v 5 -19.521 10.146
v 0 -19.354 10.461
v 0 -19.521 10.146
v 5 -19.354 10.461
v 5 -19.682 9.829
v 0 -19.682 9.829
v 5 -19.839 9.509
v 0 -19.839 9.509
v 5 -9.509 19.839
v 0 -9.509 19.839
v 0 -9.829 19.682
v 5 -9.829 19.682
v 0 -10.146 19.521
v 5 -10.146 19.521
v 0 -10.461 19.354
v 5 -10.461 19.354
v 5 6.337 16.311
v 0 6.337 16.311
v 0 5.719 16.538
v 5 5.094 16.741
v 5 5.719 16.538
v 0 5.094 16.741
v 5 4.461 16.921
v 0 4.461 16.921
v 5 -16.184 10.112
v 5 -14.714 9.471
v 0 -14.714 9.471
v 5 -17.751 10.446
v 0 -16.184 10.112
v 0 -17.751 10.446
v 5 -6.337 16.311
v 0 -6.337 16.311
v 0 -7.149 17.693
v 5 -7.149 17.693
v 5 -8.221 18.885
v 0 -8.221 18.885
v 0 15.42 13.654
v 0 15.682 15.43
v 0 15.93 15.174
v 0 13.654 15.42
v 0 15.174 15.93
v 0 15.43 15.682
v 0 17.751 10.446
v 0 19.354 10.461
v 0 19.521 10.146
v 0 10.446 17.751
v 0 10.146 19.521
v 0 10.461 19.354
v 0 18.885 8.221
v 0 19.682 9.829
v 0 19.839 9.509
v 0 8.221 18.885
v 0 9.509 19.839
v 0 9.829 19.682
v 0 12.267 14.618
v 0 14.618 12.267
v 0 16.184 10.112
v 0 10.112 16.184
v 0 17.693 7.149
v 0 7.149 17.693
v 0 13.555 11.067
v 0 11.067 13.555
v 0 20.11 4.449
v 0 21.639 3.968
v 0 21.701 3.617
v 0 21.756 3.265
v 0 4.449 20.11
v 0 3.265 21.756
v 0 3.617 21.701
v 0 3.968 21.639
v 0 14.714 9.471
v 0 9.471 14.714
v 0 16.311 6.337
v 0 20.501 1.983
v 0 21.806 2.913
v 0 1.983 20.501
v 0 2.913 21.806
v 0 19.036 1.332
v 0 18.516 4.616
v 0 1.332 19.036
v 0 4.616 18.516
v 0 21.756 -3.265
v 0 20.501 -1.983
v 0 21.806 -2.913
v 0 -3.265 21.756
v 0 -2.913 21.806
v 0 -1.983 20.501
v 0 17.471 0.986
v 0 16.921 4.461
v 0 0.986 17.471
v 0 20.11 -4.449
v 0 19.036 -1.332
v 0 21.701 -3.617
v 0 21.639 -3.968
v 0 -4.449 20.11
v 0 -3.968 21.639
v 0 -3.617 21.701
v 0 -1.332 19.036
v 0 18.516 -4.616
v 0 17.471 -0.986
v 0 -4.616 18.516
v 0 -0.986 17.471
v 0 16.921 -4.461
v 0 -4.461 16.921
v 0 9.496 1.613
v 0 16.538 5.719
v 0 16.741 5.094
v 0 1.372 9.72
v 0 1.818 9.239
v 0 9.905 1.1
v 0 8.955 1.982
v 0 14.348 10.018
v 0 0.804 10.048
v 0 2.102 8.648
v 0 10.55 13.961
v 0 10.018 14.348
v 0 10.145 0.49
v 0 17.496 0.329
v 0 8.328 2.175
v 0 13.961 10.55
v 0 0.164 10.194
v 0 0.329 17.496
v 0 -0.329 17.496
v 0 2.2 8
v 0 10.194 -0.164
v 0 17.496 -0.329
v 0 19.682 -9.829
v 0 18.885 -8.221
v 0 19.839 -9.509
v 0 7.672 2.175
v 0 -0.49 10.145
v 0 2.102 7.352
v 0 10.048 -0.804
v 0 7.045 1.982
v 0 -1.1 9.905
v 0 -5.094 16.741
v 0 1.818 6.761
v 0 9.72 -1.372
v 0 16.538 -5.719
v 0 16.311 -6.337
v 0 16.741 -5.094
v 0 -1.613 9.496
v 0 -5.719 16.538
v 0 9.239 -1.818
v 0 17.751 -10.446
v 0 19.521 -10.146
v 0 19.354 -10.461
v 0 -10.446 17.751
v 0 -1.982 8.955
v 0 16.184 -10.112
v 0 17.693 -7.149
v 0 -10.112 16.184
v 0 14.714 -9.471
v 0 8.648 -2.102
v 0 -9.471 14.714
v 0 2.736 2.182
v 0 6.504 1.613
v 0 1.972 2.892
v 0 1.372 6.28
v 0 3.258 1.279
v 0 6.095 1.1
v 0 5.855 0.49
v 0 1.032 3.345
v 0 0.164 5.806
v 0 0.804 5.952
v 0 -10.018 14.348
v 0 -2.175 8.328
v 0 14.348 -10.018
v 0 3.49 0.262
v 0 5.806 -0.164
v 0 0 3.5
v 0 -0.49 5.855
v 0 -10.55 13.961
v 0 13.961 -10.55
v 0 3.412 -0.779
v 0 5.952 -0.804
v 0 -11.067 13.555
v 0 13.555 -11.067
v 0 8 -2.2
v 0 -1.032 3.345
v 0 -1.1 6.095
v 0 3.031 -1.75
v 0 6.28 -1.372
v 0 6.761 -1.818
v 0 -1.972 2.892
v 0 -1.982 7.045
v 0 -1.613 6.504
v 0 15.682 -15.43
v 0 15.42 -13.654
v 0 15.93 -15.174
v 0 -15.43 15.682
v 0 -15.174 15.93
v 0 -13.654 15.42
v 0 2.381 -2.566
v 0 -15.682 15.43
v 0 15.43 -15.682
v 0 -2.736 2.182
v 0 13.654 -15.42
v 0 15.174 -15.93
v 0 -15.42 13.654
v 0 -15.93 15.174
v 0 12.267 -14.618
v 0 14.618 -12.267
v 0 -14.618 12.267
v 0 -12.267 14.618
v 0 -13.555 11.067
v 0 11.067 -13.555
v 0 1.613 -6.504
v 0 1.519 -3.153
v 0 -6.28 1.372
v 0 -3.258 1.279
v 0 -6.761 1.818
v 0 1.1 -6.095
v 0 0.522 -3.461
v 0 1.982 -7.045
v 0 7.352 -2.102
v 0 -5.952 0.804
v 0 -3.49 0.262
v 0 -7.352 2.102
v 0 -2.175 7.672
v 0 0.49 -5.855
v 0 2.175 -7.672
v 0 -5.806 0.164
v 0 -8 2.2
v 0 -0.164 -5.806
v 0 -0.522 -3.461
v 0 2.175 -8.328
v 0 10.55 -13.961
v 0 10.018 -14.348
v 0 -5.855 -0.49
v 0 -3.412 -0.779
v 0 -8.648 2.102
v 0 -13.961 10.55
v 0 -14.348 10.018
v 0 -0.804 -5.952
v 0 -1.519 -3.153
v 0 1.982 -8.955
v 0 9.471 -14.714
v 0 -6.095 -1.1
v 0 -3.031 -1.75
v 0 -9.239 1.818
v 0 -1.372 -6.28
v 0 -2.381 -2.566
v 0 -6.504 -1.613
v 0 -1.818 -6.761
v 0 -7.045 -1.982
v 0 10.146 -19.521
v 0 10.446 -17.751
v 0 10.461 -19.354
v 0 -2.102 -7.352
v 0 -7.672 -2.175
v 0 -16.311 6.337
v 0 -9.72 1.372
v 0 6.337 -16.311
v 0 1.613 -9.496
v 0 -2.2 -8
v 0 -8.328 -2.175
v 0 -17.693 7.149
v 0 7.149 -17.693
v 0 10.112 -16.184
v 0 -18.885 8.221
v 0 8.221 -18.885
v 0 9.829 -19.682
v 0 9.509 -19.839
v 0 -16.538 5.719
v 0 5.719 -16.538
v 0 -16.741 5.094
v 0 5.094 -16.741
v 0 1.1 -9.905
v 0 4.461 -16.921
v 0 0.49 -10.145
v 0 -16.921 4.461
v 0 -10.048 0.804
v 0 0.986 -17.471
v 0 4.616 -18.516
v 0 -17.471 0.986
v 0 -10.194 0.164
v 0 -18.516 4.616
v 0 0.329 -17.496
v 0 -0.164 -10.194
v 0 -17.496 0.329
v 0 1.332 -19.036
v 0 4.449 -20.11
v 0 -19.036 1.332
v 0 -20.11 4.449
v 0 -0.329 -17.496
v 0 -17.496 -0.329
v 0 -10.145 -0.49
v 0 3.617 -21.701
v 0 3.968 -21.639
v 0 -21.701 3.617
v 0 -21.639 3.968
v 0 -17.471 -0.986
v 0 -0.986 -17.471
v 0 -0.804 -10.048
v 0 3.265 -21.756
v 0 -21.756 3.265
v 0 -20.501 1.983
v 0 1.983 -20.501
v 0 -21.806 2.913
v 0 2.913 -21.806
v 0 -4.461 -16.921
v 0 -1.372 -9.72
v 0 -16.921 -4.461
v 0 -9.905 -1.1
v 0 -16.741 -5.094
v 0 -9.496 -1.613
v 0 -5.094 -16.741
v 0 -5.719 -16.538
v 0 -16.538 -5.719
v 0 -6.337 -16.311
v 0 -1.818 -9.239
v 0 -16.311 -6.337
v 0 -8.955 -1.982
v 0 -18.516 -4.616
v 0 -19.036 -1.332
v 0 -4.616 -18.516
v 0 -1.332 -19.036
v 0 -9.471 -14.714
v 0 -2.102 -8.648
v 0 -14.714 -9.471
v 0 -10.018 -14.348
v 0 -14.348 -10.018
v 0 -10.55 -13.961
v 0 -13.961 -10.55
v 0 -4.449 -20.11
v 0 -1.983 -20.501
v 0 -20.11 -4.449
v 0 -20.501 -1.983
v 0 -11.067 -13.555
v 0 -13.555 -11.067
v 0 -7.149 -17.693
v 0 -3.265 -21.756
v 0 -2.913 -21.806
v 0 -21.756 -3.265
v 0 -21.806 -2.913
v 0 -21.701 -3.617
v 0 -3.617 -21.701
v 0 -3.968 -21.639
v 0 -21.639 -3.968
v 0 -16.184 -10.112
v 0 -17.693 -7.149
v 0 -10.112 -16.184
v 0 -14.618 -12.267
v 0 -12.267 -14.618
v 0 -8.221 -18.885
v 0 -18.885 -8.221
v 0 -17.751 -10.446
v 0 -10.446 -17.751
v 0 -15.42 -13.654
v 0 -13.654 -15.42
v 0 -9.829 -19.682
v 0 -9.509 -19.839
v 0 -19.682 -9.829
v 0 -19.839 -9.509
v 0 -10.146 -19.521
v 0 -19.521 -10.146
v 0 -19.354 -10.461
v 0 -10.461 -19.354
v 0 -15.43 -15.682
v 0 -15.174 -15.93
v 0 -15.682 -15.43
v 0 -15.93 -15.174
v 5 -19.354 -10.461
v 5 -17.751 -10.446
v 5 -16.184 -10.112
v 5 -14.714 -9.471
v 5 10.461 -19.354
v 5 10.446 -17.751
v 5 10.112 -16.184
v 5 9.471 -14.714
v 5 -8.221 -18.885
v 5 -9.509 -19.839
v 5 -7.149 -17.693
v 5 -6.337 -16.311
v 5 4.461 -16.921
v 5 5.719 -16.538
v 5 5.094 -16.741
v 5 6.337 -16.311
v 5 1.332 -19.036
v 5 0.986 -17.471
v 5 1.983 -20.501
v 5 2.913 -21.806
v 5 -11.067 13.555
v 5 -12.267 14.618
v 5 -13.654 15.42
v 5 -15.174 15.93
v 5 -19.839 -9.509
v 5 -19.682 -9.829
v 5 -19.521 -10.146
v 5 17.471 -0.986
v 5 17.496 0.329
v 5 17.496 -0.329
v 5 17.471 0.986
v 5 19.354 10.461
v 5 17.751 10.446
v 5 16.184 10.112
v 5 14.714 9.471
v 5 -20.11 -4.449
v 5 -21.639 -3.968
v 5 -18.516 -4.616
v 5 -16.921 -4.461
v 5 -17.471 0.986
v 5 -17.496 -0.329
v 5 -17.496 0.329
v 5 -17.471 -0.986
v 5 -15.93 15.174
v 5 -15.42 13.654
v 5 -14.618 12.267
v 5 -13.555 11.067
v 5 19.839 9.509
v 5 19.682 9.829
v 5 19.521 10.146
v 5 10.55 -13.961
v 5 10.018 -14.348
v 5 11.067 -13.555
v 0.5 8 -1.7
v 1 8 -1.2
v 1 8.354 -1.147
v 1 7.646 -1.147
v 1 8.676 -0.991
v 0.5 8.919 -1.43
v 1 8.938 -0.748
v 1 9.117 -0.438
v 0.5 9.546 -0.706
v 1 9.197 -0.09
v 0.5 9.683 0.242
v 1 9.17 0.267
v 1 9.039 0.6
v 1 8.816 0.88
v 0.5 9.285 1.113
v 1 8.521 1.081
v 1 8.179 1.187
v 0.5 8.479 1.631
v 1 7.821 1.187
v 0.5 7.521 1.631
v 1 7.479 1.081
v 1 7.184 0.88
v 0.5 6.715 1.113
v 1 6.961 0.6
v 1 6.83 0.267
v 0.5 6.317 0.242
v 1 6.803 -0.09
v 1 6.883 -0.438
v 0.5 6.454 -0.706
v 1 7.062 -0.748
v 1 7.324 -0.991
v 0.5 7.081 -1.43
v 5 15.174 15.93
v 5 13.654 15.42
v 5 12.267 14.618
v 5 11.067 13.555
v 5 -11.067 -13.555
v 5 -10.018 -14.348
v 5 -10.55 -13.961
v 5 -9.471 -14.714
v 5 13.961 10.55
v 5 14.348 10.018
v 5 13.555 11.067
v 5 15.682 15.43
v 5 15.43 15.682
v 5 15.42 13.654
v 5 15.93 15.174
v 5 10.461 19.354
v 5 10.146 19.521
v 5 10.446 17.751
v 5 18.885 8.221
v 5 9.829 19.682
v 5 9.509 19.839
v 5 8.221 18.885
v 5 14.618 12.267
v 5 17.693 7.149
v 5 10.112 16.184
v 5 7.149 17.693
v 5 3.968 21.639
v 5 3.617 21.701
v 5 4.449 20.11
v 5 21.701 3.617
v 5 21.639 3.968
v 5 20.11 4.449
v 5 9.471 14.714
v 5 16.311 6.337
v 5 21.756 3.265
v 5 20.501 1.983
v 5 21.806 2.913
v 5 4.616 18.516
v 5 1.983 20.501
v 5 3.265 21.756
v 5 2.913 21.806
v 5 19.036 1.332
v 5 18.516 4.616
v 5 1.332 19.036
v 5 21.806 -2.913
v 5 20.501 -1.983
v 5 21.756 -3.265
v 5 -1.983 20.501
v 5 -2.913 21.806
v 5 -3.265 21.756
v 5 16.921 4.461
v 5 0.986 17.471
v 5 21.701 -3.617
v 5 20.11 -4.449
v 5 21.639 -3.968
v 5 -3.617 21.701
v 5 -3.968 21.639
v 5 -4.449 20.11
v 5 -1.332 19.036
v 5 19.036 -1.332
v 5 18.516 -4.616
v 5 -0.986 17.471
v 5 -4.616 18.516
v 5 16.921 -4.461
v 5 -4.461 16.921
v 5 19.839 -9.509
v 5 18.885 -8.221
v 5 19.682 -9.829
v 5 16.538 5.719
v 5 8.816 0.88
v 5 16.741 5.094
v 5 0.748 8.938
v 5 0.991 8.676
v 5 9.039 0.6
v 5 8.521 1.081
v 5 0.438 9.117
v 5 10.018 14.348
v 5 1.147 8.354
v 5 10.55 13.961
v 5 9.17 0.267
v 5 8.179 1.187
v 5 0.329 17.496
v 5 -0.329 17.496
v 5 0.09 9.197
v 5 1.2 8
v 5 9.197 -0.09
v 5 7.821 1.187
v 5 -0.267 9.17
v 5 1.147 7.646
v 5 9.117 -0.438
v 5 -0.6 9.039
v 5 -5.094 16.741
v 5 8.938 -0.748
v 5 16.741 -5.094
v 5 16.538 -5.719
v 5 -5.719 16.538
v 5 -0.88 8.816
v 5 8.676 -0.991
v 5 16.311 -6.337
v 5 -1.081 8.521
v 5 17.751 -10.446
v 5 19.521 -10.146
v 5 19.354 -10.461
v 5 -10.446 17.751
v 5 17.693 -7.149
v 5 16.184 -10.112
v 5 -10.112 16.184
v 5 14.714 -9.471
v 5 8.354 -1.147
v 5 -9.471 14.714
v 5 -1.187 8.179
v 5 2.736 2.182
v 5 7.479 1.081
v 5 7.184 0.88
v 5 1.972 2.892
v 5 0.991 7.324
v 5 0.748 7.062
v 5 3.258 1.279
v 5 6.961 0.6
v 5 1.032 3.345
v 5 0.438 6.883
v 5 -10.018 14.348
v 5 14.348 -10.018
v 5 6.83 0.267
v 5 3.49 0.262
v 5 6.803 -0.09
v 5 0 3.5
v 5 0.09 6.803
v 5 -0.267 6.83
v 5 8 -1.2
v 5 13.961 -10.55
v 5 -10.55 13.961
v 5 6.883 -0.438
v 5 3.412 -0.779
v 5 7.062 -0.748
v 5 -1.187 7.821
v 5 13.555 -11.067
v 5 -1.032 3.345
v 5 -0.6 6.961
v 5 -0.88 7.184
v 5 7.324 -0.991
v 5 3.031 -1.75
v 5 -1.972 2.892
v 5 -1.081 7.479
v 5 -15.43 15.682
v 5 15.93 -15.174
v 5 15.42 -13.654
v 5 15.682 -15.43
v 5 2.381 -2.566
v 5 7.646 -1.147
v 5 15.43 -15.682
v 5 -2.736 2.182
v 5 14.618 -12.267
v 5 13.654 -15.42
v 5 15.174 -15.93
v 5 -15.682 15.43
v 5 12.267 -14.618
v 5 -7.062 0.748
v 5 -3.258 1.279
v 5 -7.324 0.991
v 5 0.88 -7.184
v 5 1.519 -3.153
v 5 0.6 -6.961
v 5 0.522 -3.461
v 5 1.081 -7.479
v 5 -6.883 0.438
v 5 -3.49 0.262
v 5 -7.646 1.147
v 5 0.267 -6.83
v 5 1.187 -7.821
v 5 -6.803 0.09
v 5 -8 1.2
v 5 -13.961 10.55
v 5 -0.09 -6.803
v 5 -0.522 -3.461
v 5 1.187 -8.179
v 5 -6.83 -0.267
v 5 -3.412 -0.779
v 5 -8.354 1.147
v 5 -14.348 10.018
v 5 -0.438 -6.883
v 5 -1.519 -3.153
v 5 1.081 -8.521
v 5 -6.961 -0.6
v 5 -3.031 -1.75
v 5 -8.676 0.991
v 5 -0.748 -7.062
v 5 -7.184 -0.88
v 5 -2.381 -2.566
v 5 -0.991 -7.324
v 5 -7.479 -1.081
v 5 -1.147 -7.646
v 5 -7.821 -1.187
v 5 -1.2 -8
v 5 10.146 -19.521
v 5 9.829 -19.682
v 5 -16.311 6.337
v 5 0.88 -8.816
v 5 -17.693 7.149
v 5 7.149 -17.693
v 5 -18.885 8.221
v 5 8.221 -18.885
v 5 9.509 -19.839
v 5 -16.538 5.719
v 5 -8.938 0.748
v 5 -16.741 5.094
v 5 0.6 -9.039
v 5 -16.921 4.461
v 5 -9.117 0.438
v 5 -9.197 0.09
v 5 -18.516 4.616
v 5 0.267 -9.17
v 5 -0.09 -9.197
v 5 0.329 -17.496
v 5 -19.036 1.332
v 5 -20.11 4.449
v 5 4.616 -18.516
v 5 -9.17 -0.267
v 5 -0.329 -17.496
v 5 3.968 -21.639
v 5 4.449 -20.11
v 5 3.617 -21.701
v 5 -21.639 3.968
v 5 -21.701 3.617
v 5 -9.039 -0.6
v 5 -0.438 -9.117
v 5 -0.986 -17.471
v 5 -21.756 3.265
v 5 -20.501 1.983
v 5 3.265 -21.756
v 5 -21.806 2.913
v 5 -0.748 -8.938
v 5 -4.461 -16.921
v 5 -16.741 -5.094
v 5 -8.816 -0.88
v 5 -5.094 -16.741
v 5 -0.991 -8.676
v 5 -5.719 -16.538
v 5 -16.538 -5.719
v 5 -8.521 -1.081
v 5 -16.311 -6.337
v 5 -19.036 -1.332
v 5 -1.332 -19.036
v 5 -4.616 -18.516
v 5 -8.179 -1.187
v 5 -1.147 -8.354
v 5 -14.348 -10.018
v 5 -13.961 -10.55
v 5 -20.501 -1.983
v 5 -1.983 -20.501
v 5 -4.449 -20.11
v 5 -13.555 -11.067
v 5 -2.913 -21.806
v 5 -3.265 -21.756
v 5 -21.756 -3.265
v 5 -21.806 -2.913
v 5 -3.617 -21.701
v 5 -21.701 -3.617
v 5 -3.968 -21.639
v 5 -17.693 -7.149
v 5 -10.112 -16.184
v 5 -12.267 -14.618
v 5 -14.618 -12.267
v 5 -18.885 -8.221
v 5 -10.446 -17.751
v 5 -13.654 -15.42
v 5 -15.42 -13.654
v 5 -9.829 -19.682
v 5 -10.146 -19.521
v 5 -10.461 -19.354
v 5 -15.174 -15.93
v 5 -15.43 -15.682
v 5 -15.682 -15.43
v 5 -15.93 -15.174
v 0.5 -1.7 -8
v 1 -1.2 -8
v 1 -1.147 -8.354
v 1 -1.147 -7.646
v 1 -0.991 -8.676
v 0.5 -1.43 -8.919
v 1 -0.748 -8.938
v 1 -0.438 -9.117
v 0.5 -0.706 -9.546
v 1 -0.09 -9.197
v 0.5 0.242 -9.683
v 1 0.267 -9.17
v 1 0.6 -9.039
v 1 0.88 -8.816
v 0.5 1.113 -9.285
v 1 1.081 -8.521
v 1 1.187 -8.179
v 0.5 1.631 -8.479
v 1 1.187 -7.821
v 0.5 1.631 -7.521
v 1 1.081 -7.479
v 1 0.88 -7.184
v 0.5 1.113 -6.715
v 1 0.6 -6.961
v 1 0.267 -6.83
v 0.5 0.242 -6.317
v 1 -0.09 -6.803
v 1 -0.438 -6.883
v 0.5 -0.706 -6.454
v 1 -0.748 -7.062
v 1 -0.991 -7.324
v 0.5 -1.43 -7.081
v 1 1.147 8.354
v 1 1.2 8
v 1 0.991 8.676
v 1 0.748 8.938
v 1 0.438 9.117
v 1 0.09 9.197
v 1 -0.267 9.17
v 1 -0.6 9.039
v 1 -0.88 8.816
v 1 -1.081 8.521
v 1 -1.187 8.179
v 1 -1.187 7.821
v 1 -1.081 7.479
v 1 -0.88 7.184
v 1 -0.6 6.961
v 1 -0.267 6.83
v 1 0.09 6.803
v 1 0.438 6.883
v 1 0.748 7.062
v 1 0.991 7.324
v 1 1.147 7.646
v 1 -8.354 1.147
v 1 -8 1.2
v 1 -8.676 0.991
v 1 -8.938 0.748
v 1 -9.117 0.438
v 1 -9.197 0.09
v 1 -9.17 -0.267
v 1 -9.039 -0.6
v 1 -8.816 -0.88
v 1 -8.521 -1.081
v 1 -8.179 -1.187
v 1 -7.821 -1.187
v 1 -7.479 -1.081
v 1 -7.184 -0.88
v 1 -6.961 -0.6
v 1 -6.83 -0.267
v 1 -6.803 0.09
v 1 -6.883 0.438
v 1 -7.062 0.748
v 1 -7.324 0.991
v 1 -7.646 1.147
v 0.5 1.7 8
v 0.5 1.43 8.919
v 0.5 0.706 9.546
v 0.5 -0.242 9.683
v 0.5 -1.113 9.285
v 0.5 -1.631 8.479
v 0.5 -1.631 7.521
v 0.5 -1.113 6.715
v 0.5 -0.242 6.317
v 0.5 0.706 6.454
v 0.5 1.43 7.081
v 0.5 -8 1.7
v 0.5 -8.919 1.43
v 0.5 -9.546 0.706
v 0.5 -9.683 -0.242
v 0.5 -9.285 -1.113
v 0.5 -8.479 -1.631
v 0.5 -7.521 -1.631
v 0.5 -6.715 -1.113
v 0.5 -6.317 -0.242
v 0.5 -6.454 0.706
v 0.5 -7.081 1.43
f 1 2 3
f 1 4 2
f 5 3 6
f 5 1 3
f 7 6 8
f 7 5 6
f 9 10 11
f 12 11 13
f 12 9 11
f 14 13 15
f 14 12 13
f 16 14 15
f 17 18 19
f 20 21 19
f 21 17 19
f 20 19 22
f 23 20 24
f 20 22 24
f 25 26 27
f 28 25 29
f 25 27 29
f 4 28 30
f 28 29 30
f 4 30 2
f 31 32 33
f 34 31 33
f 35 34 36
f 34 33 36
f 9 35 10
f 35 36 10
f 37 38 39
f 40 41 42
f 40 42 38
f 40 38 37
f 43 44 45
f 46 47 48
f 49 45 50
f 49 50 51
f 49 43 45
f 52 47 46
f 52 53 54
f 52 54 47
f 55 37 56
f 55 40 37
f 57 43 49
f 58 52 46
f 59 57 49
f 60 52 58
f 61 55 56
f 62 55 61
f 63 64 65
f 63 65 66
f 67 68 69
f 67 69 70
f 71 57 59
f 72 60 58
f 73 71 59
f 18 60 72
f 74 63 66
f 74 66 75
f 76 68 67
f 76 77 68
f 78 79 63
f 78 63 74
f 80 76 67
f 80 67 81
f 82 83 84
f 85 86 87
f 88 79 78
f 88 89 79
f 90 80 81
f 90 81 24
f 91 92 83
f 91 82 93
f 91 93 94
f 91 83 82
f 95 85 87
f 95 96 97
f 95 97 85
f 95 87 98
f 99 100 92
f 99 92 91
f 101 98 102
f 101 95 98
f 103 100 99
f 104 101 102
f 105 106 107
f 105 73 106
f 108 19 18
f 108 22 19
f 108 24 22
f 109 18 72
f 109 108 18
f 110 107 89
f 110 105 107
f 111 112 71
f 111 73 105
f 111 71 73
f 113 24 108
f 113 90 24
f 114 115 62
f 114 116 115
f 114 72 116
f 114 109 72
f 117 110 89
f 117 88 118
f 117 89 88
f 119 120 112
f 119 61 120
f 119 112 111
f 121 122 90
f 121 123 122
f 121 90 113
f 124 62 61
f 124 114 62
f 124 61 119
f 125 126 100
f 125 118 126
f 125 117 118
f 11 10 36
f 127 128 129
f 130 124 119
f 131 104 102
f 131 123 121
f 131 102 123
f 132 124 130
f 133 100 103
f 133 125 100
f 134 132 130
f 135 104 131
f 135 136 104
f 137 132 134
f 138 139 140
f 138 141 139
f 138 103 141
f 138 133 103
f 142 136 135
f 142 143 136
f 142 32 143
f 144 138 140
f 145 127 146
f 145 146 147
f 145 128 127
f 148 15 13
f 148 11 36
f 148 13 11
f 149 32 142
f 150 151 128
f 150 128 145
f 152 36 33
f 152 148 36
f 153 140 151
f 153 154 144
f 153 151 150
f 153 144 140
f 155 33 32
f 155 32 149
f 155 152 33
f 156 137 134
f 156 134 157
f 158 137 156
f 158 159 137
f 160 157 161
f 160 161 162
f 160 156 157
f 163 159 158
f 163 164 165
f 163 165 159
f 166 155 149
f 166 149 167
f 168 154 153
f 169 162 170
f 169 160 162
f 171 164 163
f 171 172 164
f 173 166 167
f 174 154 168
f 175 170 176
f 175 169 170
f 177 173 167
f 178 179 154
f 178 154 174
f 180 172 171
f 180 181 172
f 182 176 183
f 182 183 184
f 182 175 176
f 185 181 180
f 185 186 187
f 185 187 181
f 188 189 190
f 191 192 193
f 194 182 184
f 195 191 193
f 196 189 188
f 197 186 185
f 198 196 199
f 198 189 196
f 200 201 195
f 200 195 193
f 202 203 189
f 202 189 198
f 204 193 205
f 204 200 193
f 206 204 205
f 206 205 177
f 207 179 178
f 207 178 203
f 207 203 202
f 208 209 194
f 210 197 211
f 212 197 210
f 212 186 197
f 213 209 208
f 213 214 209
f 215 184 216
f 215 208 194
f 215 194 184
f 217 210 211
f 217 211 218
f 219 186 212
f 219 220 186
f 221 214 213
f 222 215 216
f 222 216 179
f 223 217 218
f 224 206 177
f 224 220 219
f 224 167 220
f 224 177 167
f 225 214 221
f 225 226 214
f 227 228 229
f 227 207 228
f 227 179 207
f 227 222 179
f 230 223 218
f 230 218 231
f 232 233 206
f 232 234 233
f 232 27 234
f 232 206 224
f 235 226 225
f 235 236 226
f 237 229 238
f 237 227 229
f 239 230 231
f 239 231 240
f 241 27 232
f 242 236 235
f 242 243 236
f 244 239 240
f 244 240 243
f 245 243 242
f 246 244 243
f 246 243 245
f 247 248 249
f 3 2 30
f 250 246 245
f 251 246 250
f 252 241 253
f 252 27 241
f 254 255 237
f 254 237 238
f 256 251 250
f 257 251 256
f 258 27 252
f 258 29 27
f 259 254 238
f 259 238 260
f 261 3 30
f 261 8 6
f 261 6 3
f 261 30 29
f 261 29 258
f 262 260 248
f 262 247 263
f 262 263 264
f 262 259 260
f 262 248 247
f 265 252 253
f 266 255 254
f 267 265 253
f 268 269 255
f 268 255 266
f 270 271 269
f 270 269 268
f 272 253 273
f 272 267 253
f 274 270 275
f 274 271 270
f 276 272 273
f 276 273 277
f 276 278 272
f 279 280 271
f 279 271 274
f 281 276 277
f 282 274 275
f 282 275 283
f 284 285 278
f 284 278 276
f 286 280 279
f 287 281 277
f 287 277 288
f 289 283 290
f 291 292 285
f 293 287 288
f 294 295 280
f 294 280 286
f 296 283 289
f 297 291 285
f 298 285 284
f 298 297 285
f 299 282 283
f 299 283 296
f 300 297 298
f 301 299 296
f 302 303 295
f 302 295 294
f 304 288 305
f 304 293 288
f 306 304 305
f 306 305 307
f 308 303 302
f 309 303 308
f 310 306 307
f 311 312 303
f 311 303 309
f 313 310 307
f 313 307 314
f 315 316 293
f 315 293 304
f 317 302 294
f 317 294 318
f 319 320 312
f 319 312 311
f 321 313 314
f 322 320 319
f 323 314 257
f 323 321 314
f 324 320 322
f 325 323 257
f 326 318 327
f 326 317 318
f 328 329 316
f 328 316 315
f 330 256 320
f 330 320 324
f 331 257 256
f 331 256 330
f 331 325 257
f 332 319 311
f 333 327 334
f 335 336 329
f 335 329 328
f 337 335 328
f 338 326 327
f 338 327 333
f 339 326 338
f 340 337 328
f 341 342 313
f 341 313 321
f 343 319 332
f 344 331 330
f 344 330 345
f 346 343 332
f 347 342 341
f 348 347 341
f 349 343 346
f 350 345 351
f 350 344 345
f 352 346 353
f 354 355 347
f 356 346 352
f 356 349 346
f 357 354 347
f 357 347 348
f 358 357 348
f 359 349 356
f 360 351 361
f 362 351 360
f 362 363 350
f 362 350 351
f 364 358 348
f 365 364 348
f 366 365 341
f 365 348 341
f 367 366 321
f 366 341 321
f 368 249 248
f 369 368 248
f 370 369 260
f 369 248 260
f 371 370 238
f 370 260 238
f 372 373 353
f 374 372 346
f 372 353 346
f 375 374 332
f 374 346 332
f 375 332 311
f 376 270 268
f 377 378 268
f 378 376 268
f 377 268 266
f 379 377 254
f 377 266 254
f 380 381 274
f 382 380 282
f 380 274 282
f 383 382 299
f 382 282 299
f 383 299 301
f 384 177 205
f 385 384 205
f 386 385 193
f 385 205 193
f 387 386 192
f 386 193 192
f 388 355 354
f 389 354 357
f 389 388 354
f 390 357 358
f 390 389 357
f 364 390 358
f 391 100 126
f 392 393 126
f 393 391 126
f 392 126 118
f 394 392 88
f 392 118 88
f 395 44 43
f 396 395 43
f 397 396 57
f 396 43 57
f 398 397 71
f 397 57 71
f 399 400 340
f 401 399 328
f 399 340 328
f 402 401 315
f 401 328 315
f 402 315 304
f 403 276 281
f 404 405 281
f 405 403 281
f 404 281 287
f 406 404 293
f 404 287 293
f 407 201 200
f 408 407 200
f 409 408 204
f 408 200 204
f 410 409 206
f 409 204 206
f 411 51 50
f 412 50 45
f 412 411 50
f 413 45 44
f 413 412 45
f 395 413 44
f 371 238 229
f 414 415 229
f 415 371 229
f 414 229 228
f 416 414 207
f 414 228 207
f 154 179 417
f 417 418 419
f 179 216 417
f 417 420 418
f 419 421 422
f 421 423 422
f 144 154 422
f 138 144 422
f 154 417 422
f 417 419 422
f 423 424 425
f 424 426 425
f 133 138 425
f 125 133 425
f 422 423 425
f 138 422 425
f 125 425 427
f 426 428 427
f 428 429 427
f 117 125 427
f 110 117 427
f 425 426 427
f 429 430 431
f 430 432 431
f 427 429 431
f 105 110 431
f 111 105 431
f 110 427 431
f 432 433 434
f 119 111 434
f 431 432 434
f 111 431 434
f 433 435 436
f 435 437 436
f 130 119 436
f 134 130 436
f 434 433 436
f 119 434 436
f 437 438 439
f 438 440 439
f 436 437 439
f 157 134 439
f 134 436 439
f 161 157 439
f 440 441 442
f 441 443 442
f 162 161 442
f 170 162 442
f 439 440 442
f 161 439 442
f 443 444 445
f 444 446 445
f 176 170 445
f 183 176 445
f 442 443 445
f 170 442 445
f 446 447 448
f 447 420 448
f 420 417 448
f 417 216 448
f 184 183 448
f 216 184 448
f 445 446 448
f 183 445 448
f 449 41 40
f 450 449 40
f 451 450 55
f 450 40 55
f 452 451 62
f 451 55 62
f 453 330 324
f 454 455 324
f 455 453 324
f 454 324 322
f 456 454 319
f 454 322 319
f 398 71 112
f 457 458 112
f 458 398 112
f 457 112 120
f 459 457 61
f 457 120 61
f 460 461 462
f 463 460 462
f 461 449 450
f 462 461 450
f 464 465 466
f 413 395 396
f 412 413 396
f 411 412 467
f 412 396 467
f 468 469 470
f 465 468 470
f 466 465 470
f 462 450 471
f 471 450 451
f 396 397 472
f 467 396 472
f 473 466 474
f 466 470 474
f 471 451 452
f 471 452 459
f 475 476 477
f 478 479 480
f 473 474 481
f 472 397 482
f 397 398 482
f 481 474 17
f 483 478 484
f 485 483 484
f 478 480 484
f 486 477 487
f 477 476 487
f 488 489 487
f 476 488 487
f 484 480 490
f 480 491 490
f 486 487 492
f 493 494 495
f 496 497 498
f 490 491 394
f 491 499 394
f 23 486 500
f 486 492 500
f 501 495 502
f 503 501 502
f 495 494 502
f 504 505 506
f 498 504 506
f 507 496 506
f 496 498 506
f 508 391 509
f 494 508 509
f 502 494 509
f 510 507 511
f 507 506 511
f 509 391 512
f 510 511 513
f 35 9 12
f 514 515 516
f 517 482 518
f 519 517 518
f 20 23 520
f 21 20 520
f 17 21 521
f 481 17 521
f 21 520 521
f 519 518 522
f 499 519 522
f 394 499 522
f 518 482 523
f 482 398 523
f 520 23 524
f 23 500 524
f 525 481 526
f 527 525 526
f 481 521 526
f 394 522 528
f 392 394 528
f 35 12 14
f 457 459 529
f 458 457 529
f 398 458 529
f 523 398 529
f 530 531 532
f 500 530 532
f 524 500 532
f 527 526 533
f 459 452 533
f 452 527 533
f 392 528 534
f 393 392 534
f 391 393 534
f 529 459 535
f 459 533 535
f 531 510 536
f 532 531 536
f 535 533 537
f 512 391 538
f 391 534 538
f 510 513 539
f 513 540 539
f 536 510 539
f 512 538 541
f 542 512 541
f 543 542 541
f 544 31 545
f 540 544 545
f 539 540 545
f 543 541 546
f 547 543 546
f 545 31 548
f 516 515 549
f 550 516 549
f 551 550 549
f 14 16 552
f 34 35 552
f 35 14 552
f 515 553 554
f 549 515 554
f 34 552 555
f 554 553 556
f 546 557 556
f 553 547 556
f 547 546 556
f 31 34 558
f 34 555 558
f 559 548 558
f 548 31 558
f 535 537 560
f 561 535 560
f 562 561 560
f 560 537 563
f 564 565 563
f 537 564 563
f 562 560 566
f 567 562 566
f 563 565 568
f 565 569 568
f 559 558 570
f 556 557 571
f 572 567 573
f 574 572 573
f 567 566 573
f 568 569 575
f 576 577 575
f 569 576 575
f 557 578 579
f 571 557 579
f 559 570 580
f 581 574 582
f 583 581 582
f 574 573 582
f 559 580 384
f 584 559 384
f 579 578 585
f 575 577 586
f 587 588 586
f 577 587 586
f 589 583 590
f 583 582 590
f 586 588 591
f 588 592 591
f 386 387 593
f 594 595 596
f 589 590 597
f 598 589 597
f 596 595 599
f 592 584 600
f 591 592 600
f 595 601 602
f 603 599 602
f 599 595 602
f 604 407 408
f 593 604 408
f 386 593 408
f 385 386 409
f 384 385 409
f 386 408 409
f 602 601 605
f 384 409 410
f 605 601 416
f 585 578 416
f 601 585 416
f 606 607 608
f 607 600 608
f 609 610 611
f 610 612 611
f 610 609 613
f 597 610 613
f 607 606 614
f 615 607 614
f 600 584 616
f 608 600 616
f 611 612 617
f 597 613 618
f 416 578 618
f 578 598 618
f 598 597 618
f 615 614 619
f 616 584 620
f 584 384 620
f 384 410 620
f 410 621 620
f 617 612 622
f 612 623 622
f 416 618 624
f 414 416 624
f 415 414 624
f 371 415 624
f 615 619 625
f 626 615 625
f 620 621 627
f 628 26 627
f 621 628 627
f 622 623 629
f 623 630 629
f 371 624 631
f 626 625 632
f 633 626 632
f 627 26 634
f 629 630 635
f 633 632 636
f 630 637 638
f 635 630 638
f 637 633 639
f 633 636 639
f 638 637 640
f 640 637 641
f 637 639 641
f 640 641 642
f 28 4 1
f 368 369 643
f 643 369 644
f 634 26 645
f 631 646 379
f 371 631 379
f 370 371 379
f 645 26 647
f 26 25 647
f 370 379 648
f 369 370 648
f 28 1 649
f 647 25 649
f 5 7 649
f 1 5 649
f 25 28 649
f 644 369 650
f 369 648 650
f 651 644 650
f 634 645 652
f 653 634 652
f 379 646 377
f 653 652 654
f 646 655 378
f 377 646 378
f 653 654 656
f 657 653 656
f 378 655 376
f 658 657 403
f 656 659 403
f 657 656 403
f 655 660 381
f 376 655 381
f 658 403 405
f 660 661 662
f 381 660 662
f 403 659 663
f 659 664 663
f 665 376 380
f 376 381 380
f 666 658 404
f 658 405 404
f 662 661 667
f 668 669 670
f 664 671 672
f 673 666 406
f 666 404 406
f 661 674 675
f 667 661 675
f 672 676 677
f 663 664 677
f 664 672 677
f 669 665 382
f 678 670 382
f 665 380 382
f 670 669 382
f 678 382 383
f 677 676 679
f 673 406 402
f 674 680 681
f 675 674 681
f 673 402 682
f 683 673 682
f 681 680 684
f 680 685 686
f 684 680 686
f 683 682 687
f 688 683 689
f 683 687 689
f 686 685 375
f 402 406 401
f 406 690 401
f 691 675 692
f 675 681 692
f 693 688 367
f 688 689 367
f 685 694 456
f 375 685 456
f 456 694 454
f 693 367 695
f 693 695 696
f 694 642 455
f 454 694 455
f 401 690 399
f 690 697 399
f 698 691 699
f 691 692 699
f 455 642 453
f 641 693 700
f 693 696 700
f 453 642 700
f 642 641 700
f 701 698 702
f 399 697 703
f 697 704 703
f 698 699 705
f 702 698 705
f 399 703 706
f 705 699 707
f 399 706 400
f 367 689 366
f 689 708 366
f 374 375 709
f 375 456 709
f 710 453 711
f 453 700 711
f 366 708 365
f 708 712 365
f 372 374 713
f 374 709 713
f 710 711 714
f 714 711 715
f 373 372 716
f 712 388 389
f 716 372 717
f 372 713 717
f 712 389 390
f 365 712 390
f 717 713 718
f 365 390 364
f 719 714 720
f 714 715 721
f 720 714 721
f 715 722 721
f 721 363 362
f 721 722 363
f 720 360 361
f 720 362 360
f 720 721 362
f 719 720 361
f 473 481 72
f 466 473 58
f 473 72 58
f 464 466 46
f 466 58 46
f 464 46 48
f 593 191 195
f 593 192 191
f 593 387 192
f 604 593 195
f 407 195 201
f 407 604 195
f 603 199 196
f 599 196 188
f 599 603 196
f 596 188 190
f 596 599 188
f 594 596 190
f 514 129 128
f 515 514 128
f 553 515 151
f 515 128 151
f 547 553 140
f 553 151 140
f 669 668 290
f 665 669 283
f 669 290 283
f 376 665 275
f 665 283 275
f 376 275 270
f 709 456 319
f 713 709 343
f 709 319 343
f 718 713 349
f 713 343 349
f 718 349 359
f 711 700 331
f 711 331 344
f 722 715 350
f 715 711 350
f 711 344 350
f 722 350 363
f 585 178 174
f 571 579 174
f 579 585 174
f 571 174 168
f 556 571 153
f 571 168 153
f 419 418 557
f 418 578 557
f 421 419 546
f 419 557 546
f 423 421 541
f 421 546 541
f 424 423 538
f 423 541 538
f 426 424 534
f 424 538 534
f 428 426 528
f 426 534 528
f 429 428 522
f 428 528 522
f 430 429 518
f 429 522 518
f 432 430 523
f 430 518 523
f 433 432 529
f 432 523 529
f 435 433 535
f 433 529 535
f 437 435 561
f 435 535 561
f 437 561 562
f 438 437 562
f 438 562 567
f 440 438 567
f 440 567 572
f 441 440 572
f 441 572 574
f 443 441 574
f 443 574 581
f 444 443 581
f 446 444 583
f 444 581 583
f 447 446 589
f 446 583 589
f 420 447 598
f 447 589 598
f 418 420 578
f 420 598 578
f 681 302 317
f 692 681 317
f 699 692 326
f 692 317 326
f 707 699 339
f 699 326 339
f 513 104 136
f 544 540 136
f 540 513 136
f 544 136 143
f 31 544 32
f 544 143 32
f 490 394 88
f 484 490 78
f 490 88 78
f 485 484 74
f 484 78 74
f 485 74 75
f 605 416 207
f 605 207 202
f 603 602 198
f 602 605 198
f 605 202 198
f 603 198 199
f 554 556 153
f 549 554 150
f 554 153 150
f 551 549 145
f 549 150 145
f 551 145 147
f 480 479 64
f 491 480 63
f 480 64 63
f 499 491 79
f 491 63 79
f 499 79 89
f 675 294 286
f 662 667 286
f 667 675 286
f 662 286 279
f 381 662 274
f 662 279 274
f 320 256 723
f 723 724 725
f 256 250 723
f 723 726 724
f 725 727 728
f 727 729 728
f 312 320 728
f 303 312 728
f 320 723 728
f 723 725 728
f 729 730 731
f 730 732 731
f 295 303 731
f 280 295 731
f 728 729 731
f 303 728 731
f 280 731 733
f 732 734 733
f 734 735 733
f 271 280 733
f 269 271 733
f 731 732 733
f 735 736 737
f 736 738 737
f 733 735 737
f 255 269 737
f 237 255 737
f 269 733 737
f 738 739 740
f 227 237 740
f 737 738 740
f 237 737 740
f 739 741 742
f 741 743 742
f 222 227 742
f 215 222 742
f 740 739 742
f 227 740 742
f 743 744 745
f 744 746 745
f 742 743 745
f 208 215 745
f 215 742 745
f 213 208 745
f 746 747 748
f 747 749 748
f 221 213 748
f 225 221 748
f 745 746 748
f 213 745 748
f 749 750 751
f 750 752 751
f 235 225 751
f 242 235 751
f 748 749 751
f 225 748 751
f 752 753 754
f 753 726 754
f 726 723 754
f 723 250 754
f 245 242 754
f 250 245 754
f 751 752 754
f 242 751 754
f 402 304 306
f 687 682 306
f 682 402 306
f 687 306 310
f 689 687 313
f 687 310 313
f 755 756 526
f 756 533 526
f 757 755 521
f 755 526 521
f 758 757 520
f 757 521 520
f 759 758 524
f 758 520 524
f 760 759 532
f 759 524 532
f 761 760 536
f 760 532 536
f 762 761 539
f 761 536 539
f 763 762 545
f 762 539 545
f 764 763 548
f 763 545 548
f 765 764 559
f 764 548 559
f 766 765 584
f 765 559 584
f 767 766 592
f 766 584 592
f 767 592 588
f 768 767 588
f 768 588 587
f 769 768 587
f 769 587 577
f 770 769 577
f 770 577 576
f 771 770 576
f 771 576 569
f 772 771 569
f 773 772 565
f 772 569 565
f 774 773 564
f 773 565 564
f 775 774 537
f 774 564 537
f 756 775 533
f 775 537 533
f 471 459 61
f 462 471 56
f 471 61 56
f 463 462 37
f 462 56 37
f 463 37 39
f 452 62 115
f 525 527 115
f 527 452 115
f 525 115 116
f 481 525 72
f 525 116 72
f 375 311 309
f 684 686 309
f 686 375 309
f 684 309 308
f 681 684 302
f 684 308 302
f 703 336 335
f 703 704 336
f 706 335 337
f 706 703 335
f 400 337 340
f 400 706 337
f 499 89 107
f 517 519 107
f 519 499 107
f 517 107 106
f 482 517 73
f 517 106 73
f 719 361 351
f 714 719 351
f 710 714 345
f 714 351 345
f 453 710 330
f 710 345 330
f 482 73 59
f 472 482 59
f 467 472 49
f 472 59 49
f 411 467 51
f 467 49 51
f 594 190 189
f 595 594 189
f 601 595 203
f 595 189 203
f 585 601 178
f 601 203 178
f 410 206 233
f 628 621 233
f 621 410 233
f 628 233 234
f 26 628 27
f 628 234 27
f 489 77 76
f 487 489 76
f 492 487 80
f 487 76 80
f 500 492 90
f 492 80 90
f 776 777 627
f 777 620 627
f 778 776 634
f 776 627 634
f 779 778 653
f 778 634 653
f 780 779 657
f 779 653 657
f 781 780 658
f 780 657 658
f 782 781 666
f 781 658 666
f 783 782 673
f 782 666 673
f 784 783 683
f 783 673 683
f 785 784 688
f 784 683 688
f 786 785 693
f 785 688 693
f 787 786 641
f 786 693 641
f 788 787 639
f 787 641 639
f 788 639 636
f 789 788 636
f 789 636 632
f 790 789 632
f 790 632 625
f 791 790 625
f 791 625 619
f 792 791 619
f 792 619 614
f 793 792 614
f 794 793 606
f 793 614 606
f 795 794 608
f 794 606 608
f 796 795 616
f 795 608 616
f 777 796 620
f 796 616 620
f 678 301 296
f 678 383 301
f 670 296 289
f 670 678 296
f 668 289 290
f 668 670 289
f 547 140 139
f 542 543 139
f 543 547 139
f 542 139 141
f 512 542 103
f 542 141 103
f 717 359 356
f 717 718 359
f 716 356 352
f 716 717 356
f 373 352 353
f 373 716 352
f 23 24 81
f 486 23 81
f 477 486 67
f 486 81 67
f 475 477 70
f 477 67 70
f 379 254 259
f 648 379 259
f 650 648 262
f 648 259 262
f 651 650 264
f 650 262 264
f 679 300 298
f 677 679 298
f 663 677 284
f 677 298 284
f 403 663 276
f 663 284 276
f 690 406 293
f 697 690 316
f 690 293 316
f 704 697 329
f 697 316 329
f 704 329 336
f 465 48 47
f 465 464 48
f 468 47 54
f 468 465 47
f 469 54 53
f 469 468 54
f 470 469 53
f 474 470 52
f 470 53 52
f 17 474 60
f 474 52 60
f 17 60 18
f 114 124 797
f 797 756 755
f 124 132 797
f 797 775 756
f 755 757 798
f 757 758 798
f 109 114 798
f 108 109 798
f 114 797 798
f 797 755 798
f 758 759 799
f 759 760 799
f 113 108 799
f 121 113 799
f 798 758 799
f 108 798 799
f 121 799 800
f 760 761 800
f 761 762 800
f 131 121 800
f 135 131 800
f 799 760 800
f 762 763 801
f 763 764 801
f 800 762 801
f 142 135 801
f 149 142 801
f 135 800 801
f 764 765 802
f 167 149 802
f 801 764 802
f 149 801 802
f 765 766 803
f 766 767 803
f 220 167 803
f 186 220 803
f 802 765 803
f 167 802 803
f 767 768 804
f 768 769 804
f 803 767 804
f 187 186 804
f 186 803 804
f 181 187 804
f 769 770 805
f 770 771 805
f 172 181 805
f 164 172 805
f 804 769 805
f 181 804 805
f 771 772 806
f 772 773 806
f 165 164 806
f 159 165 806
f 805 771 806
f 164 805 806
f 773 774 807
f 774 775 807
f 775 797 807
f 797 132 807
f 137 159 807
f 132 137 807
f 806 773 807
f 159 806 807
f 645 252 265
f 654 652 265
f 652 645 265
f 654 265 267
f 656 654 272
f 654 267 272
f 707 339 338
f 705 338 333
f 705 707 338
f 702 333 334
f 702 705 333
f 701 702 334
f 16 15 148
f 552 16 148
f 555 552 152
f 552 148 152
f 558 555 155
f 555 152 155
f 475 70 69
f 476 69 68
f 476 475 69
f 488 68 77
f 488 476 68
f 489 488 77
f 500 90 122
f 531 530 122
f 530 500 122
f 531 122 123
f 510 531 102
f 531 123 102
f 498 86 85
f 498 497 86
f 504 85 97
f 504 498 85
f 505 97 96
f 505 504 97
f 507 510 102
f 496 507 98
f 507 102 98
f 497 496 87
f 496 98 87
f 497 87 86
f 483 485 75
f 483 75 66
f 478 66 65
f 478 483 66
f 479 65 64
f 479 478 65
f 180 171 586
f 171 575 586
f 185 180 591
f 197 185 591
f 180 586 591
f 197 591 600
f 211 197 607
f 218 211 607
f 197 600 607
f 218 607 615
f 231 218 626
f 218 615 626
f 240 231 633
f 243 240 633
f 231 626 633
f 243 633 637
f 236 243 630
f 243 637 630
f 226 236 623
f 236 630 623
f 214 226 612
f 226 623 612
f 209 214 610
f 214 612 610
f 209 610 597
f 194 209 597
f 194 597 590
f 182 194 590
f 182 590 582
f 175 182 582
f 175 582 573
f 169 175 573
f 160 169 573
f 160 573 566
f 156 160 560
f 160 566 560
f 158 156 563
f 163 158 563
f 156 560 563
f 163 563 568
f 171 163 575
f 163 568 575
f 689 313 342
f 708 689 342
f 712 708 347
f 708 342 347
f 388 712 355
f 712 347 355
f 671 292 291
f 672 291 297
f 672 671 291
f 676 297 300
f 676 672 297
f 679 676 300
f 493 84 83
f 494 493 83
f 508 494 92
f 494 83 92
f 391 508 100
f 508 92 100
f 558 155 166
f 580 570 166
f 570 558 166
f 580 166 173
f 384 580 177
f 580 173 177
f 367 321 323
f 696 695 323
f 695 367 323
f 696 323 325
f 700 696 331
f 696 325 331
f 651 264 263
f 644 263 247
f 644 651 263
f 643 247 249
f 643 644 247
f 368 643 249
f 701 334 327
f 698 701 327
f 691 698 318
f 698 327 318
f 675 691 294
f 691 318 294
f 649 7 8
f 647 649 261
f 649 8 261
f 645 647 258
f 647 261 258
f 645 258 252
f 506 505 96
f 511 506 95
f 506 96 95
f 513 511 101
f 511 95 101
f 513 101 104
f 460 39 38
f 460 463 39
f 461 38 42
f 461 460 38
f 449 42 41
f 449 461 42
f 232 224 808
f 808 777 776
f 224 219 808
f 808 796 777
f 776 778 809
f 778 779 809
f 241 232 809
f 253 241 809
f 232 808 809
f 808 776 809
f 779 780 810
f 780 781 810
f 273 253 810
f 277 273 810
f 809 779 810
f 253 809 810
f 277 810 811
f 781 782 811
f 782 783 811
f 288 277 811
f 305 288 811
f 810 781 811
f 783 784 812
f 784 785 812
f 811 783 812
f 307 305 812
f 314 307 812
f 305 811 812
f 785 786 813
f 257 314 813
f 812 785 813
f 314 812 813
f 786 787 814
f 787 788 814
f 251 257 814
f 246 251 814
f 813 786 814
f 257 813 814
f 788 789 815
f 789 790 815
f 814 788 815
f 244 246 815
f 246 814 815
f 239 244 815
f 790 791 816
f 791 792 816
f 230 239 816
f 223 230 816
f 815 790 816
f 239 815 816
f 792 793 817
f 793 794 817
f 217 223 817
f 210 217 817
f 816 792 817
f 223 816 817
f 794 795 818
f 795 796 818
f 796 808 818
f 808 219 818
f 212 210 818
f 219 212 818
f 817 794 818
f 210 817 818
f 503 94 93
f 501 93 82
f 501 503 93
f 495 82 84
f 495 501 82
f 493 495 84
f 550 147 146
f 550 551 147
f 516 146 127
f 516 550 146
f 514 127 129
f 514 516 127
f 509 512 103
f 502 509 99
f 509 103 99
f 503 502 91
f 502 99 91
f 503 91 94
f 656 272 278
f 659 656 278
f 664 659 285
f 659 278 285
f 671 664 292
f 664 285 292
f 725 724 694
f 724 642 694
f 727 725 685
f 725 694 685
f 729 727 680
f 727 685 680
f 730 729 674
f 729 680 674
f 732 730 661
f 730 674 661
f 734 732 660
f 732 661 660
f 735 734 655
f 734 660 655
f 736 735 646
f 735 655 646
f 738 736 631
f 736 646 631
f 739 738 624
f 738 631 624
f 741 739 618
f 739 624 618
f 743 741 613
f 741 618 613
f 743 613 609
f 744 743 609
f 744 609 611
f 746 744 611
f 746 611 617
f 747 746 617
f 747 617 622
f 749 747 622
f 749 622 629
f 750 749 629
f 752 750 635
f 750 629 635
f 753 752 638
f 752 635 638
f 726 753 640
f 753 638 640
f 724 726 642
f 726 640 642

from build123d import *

# Parameters (mm, degrees)
BASPROSKE_W                                    = 5
BASPROSKE_H                                    = 22
TOOTHCUT_DEPTH                                 = 32.511902513
TEETHCUTS_COUNT                                = 20
TEETHCUTS_ANGLE                                = 342
BORSKE_R                                       = 3.5
BORE_DEPTH                                     = 50.0000508
FRAISAGE_POUR_VIS_T_TE_FRAIS_E_M21_D           = 2.4
FRAISAGE_POUR_VIS_T_TE_FRAIS_E_M21_CSINK_D     = 4.4
FRAISAGE_POUR_VIS_T_TE_FRAIS_E_M21_CSINK_ANGLE = 90
R_P_TITION_CIRCULAIRE1_COUNT                   = 4


with BuildPart() as part:
    # BasProSke → Base-Revolve (revolve)
    with BuildSketch(Plane(origin=(0, 0, 0), x_dir=(1, 0, 0), z_dir=(0, 1, 0)), mode=Mode.PRIVATE) as base_revolve_sk:
        with Locations((2.5, 11)):
            Rectangle(BASPROSKE_W, BASPROSKE_H)
    revolve(base_revolve_sk.sketch.rotate(Axis((-10, 0, 0), (1, 0, 0)), 180), axis=Axis((-10, 0, 0), (1, 0, 0)))

    # TooCutSke → ToothCut (cut, through all)
    with BuildSketch(Plane(origin=(0, 0, 0), x_dir=(0, 0, -1), z_dir=(1, 0, 0))):
        with BuildLine():
            ThreePointArc((0.986171591, 17.471189616), (0, 17.499), (-0.986171591, 17.471189616))
            ThreePointArc((-0.986171591, 17.471189616), (-1.626916196, 19.798789858), (-2.932850173, 21.829260982))
            ThreePointArc((-2.932850173, 21.829260982), (0, 22.0254), (2.932850173, 21.829260982))
            ThreePointArc((2.932850173, 21.829260982), (1.626916196, 19.798789858), (0.986171591, 17.471189616))
        make_face()
    toothcut = extrude(amount=TOOTHCUT_DEPTH, mode=Mode.SUBTRACT)

    # TeethCuts: ToothCut ×20 about axis
    teethcuts_axis = Axis((-10, 0, 0), (1, 0, 0))
    for i in range(1, TEETHCUTS_COUNT):
        add(toothcut.rotate(teethcuts_axis, i * TEETHCUTS_ANGLE / (TEETHCUTS_COUNT - 1)), mode=Mode.SUBTRACT)

    # BorSke → Bore (cut, symmetric)
    with BuildSketch(Plane(origin=(0, 0, 0), x_dir=(0, 0, -1), z_dir=(1, 0, 0))):
        with Locations(Location((0, 0, 0), (0, 0, 180))):
            Circle(BORSKE_R)
    extrude(amount=BORE_DEPTH, both=True, mode=Mode.SUBTRACT)

    # Fraisage pour vis à tête fraisée M21 (through all)
    with Locations(Plane.ZY):
        with Locations((0, 8)):
            fraisage_pour_vis_t_te_frais_e_m21 = CounterSinkHole(FRAISAGE_POUR_VIS_T_TE_FRAIS_E_M21_D / 2, FRAISAGE_POUR_VIS_T_TE_FRAIS_E_M21_CSINK_D / 2, counter_sink_angle=FRAISAGE_POUR_VIS_T_TE_FRAIS_E_M21_CSINK_ANGLE)

    # Répétition circulaire1: Fraisage pour vis à tête fraisée M21 ×4 about axis
    r_p_tition_circulaire1_axis = Axis((0, 0, 0), (1, 0, 0))
    for i in range(1, R_P_TITION_CIRCULAIRE1_COUNT):
        add(fraisage_pour_vis_t_te_frais_e_m21.rotate(r_p_tition_circulaire1_axis, i * 360 / R_P_TITION_CIRCULAIRE1_COUNT), mode=Mode.SUBTRACT)


solid = part.part
